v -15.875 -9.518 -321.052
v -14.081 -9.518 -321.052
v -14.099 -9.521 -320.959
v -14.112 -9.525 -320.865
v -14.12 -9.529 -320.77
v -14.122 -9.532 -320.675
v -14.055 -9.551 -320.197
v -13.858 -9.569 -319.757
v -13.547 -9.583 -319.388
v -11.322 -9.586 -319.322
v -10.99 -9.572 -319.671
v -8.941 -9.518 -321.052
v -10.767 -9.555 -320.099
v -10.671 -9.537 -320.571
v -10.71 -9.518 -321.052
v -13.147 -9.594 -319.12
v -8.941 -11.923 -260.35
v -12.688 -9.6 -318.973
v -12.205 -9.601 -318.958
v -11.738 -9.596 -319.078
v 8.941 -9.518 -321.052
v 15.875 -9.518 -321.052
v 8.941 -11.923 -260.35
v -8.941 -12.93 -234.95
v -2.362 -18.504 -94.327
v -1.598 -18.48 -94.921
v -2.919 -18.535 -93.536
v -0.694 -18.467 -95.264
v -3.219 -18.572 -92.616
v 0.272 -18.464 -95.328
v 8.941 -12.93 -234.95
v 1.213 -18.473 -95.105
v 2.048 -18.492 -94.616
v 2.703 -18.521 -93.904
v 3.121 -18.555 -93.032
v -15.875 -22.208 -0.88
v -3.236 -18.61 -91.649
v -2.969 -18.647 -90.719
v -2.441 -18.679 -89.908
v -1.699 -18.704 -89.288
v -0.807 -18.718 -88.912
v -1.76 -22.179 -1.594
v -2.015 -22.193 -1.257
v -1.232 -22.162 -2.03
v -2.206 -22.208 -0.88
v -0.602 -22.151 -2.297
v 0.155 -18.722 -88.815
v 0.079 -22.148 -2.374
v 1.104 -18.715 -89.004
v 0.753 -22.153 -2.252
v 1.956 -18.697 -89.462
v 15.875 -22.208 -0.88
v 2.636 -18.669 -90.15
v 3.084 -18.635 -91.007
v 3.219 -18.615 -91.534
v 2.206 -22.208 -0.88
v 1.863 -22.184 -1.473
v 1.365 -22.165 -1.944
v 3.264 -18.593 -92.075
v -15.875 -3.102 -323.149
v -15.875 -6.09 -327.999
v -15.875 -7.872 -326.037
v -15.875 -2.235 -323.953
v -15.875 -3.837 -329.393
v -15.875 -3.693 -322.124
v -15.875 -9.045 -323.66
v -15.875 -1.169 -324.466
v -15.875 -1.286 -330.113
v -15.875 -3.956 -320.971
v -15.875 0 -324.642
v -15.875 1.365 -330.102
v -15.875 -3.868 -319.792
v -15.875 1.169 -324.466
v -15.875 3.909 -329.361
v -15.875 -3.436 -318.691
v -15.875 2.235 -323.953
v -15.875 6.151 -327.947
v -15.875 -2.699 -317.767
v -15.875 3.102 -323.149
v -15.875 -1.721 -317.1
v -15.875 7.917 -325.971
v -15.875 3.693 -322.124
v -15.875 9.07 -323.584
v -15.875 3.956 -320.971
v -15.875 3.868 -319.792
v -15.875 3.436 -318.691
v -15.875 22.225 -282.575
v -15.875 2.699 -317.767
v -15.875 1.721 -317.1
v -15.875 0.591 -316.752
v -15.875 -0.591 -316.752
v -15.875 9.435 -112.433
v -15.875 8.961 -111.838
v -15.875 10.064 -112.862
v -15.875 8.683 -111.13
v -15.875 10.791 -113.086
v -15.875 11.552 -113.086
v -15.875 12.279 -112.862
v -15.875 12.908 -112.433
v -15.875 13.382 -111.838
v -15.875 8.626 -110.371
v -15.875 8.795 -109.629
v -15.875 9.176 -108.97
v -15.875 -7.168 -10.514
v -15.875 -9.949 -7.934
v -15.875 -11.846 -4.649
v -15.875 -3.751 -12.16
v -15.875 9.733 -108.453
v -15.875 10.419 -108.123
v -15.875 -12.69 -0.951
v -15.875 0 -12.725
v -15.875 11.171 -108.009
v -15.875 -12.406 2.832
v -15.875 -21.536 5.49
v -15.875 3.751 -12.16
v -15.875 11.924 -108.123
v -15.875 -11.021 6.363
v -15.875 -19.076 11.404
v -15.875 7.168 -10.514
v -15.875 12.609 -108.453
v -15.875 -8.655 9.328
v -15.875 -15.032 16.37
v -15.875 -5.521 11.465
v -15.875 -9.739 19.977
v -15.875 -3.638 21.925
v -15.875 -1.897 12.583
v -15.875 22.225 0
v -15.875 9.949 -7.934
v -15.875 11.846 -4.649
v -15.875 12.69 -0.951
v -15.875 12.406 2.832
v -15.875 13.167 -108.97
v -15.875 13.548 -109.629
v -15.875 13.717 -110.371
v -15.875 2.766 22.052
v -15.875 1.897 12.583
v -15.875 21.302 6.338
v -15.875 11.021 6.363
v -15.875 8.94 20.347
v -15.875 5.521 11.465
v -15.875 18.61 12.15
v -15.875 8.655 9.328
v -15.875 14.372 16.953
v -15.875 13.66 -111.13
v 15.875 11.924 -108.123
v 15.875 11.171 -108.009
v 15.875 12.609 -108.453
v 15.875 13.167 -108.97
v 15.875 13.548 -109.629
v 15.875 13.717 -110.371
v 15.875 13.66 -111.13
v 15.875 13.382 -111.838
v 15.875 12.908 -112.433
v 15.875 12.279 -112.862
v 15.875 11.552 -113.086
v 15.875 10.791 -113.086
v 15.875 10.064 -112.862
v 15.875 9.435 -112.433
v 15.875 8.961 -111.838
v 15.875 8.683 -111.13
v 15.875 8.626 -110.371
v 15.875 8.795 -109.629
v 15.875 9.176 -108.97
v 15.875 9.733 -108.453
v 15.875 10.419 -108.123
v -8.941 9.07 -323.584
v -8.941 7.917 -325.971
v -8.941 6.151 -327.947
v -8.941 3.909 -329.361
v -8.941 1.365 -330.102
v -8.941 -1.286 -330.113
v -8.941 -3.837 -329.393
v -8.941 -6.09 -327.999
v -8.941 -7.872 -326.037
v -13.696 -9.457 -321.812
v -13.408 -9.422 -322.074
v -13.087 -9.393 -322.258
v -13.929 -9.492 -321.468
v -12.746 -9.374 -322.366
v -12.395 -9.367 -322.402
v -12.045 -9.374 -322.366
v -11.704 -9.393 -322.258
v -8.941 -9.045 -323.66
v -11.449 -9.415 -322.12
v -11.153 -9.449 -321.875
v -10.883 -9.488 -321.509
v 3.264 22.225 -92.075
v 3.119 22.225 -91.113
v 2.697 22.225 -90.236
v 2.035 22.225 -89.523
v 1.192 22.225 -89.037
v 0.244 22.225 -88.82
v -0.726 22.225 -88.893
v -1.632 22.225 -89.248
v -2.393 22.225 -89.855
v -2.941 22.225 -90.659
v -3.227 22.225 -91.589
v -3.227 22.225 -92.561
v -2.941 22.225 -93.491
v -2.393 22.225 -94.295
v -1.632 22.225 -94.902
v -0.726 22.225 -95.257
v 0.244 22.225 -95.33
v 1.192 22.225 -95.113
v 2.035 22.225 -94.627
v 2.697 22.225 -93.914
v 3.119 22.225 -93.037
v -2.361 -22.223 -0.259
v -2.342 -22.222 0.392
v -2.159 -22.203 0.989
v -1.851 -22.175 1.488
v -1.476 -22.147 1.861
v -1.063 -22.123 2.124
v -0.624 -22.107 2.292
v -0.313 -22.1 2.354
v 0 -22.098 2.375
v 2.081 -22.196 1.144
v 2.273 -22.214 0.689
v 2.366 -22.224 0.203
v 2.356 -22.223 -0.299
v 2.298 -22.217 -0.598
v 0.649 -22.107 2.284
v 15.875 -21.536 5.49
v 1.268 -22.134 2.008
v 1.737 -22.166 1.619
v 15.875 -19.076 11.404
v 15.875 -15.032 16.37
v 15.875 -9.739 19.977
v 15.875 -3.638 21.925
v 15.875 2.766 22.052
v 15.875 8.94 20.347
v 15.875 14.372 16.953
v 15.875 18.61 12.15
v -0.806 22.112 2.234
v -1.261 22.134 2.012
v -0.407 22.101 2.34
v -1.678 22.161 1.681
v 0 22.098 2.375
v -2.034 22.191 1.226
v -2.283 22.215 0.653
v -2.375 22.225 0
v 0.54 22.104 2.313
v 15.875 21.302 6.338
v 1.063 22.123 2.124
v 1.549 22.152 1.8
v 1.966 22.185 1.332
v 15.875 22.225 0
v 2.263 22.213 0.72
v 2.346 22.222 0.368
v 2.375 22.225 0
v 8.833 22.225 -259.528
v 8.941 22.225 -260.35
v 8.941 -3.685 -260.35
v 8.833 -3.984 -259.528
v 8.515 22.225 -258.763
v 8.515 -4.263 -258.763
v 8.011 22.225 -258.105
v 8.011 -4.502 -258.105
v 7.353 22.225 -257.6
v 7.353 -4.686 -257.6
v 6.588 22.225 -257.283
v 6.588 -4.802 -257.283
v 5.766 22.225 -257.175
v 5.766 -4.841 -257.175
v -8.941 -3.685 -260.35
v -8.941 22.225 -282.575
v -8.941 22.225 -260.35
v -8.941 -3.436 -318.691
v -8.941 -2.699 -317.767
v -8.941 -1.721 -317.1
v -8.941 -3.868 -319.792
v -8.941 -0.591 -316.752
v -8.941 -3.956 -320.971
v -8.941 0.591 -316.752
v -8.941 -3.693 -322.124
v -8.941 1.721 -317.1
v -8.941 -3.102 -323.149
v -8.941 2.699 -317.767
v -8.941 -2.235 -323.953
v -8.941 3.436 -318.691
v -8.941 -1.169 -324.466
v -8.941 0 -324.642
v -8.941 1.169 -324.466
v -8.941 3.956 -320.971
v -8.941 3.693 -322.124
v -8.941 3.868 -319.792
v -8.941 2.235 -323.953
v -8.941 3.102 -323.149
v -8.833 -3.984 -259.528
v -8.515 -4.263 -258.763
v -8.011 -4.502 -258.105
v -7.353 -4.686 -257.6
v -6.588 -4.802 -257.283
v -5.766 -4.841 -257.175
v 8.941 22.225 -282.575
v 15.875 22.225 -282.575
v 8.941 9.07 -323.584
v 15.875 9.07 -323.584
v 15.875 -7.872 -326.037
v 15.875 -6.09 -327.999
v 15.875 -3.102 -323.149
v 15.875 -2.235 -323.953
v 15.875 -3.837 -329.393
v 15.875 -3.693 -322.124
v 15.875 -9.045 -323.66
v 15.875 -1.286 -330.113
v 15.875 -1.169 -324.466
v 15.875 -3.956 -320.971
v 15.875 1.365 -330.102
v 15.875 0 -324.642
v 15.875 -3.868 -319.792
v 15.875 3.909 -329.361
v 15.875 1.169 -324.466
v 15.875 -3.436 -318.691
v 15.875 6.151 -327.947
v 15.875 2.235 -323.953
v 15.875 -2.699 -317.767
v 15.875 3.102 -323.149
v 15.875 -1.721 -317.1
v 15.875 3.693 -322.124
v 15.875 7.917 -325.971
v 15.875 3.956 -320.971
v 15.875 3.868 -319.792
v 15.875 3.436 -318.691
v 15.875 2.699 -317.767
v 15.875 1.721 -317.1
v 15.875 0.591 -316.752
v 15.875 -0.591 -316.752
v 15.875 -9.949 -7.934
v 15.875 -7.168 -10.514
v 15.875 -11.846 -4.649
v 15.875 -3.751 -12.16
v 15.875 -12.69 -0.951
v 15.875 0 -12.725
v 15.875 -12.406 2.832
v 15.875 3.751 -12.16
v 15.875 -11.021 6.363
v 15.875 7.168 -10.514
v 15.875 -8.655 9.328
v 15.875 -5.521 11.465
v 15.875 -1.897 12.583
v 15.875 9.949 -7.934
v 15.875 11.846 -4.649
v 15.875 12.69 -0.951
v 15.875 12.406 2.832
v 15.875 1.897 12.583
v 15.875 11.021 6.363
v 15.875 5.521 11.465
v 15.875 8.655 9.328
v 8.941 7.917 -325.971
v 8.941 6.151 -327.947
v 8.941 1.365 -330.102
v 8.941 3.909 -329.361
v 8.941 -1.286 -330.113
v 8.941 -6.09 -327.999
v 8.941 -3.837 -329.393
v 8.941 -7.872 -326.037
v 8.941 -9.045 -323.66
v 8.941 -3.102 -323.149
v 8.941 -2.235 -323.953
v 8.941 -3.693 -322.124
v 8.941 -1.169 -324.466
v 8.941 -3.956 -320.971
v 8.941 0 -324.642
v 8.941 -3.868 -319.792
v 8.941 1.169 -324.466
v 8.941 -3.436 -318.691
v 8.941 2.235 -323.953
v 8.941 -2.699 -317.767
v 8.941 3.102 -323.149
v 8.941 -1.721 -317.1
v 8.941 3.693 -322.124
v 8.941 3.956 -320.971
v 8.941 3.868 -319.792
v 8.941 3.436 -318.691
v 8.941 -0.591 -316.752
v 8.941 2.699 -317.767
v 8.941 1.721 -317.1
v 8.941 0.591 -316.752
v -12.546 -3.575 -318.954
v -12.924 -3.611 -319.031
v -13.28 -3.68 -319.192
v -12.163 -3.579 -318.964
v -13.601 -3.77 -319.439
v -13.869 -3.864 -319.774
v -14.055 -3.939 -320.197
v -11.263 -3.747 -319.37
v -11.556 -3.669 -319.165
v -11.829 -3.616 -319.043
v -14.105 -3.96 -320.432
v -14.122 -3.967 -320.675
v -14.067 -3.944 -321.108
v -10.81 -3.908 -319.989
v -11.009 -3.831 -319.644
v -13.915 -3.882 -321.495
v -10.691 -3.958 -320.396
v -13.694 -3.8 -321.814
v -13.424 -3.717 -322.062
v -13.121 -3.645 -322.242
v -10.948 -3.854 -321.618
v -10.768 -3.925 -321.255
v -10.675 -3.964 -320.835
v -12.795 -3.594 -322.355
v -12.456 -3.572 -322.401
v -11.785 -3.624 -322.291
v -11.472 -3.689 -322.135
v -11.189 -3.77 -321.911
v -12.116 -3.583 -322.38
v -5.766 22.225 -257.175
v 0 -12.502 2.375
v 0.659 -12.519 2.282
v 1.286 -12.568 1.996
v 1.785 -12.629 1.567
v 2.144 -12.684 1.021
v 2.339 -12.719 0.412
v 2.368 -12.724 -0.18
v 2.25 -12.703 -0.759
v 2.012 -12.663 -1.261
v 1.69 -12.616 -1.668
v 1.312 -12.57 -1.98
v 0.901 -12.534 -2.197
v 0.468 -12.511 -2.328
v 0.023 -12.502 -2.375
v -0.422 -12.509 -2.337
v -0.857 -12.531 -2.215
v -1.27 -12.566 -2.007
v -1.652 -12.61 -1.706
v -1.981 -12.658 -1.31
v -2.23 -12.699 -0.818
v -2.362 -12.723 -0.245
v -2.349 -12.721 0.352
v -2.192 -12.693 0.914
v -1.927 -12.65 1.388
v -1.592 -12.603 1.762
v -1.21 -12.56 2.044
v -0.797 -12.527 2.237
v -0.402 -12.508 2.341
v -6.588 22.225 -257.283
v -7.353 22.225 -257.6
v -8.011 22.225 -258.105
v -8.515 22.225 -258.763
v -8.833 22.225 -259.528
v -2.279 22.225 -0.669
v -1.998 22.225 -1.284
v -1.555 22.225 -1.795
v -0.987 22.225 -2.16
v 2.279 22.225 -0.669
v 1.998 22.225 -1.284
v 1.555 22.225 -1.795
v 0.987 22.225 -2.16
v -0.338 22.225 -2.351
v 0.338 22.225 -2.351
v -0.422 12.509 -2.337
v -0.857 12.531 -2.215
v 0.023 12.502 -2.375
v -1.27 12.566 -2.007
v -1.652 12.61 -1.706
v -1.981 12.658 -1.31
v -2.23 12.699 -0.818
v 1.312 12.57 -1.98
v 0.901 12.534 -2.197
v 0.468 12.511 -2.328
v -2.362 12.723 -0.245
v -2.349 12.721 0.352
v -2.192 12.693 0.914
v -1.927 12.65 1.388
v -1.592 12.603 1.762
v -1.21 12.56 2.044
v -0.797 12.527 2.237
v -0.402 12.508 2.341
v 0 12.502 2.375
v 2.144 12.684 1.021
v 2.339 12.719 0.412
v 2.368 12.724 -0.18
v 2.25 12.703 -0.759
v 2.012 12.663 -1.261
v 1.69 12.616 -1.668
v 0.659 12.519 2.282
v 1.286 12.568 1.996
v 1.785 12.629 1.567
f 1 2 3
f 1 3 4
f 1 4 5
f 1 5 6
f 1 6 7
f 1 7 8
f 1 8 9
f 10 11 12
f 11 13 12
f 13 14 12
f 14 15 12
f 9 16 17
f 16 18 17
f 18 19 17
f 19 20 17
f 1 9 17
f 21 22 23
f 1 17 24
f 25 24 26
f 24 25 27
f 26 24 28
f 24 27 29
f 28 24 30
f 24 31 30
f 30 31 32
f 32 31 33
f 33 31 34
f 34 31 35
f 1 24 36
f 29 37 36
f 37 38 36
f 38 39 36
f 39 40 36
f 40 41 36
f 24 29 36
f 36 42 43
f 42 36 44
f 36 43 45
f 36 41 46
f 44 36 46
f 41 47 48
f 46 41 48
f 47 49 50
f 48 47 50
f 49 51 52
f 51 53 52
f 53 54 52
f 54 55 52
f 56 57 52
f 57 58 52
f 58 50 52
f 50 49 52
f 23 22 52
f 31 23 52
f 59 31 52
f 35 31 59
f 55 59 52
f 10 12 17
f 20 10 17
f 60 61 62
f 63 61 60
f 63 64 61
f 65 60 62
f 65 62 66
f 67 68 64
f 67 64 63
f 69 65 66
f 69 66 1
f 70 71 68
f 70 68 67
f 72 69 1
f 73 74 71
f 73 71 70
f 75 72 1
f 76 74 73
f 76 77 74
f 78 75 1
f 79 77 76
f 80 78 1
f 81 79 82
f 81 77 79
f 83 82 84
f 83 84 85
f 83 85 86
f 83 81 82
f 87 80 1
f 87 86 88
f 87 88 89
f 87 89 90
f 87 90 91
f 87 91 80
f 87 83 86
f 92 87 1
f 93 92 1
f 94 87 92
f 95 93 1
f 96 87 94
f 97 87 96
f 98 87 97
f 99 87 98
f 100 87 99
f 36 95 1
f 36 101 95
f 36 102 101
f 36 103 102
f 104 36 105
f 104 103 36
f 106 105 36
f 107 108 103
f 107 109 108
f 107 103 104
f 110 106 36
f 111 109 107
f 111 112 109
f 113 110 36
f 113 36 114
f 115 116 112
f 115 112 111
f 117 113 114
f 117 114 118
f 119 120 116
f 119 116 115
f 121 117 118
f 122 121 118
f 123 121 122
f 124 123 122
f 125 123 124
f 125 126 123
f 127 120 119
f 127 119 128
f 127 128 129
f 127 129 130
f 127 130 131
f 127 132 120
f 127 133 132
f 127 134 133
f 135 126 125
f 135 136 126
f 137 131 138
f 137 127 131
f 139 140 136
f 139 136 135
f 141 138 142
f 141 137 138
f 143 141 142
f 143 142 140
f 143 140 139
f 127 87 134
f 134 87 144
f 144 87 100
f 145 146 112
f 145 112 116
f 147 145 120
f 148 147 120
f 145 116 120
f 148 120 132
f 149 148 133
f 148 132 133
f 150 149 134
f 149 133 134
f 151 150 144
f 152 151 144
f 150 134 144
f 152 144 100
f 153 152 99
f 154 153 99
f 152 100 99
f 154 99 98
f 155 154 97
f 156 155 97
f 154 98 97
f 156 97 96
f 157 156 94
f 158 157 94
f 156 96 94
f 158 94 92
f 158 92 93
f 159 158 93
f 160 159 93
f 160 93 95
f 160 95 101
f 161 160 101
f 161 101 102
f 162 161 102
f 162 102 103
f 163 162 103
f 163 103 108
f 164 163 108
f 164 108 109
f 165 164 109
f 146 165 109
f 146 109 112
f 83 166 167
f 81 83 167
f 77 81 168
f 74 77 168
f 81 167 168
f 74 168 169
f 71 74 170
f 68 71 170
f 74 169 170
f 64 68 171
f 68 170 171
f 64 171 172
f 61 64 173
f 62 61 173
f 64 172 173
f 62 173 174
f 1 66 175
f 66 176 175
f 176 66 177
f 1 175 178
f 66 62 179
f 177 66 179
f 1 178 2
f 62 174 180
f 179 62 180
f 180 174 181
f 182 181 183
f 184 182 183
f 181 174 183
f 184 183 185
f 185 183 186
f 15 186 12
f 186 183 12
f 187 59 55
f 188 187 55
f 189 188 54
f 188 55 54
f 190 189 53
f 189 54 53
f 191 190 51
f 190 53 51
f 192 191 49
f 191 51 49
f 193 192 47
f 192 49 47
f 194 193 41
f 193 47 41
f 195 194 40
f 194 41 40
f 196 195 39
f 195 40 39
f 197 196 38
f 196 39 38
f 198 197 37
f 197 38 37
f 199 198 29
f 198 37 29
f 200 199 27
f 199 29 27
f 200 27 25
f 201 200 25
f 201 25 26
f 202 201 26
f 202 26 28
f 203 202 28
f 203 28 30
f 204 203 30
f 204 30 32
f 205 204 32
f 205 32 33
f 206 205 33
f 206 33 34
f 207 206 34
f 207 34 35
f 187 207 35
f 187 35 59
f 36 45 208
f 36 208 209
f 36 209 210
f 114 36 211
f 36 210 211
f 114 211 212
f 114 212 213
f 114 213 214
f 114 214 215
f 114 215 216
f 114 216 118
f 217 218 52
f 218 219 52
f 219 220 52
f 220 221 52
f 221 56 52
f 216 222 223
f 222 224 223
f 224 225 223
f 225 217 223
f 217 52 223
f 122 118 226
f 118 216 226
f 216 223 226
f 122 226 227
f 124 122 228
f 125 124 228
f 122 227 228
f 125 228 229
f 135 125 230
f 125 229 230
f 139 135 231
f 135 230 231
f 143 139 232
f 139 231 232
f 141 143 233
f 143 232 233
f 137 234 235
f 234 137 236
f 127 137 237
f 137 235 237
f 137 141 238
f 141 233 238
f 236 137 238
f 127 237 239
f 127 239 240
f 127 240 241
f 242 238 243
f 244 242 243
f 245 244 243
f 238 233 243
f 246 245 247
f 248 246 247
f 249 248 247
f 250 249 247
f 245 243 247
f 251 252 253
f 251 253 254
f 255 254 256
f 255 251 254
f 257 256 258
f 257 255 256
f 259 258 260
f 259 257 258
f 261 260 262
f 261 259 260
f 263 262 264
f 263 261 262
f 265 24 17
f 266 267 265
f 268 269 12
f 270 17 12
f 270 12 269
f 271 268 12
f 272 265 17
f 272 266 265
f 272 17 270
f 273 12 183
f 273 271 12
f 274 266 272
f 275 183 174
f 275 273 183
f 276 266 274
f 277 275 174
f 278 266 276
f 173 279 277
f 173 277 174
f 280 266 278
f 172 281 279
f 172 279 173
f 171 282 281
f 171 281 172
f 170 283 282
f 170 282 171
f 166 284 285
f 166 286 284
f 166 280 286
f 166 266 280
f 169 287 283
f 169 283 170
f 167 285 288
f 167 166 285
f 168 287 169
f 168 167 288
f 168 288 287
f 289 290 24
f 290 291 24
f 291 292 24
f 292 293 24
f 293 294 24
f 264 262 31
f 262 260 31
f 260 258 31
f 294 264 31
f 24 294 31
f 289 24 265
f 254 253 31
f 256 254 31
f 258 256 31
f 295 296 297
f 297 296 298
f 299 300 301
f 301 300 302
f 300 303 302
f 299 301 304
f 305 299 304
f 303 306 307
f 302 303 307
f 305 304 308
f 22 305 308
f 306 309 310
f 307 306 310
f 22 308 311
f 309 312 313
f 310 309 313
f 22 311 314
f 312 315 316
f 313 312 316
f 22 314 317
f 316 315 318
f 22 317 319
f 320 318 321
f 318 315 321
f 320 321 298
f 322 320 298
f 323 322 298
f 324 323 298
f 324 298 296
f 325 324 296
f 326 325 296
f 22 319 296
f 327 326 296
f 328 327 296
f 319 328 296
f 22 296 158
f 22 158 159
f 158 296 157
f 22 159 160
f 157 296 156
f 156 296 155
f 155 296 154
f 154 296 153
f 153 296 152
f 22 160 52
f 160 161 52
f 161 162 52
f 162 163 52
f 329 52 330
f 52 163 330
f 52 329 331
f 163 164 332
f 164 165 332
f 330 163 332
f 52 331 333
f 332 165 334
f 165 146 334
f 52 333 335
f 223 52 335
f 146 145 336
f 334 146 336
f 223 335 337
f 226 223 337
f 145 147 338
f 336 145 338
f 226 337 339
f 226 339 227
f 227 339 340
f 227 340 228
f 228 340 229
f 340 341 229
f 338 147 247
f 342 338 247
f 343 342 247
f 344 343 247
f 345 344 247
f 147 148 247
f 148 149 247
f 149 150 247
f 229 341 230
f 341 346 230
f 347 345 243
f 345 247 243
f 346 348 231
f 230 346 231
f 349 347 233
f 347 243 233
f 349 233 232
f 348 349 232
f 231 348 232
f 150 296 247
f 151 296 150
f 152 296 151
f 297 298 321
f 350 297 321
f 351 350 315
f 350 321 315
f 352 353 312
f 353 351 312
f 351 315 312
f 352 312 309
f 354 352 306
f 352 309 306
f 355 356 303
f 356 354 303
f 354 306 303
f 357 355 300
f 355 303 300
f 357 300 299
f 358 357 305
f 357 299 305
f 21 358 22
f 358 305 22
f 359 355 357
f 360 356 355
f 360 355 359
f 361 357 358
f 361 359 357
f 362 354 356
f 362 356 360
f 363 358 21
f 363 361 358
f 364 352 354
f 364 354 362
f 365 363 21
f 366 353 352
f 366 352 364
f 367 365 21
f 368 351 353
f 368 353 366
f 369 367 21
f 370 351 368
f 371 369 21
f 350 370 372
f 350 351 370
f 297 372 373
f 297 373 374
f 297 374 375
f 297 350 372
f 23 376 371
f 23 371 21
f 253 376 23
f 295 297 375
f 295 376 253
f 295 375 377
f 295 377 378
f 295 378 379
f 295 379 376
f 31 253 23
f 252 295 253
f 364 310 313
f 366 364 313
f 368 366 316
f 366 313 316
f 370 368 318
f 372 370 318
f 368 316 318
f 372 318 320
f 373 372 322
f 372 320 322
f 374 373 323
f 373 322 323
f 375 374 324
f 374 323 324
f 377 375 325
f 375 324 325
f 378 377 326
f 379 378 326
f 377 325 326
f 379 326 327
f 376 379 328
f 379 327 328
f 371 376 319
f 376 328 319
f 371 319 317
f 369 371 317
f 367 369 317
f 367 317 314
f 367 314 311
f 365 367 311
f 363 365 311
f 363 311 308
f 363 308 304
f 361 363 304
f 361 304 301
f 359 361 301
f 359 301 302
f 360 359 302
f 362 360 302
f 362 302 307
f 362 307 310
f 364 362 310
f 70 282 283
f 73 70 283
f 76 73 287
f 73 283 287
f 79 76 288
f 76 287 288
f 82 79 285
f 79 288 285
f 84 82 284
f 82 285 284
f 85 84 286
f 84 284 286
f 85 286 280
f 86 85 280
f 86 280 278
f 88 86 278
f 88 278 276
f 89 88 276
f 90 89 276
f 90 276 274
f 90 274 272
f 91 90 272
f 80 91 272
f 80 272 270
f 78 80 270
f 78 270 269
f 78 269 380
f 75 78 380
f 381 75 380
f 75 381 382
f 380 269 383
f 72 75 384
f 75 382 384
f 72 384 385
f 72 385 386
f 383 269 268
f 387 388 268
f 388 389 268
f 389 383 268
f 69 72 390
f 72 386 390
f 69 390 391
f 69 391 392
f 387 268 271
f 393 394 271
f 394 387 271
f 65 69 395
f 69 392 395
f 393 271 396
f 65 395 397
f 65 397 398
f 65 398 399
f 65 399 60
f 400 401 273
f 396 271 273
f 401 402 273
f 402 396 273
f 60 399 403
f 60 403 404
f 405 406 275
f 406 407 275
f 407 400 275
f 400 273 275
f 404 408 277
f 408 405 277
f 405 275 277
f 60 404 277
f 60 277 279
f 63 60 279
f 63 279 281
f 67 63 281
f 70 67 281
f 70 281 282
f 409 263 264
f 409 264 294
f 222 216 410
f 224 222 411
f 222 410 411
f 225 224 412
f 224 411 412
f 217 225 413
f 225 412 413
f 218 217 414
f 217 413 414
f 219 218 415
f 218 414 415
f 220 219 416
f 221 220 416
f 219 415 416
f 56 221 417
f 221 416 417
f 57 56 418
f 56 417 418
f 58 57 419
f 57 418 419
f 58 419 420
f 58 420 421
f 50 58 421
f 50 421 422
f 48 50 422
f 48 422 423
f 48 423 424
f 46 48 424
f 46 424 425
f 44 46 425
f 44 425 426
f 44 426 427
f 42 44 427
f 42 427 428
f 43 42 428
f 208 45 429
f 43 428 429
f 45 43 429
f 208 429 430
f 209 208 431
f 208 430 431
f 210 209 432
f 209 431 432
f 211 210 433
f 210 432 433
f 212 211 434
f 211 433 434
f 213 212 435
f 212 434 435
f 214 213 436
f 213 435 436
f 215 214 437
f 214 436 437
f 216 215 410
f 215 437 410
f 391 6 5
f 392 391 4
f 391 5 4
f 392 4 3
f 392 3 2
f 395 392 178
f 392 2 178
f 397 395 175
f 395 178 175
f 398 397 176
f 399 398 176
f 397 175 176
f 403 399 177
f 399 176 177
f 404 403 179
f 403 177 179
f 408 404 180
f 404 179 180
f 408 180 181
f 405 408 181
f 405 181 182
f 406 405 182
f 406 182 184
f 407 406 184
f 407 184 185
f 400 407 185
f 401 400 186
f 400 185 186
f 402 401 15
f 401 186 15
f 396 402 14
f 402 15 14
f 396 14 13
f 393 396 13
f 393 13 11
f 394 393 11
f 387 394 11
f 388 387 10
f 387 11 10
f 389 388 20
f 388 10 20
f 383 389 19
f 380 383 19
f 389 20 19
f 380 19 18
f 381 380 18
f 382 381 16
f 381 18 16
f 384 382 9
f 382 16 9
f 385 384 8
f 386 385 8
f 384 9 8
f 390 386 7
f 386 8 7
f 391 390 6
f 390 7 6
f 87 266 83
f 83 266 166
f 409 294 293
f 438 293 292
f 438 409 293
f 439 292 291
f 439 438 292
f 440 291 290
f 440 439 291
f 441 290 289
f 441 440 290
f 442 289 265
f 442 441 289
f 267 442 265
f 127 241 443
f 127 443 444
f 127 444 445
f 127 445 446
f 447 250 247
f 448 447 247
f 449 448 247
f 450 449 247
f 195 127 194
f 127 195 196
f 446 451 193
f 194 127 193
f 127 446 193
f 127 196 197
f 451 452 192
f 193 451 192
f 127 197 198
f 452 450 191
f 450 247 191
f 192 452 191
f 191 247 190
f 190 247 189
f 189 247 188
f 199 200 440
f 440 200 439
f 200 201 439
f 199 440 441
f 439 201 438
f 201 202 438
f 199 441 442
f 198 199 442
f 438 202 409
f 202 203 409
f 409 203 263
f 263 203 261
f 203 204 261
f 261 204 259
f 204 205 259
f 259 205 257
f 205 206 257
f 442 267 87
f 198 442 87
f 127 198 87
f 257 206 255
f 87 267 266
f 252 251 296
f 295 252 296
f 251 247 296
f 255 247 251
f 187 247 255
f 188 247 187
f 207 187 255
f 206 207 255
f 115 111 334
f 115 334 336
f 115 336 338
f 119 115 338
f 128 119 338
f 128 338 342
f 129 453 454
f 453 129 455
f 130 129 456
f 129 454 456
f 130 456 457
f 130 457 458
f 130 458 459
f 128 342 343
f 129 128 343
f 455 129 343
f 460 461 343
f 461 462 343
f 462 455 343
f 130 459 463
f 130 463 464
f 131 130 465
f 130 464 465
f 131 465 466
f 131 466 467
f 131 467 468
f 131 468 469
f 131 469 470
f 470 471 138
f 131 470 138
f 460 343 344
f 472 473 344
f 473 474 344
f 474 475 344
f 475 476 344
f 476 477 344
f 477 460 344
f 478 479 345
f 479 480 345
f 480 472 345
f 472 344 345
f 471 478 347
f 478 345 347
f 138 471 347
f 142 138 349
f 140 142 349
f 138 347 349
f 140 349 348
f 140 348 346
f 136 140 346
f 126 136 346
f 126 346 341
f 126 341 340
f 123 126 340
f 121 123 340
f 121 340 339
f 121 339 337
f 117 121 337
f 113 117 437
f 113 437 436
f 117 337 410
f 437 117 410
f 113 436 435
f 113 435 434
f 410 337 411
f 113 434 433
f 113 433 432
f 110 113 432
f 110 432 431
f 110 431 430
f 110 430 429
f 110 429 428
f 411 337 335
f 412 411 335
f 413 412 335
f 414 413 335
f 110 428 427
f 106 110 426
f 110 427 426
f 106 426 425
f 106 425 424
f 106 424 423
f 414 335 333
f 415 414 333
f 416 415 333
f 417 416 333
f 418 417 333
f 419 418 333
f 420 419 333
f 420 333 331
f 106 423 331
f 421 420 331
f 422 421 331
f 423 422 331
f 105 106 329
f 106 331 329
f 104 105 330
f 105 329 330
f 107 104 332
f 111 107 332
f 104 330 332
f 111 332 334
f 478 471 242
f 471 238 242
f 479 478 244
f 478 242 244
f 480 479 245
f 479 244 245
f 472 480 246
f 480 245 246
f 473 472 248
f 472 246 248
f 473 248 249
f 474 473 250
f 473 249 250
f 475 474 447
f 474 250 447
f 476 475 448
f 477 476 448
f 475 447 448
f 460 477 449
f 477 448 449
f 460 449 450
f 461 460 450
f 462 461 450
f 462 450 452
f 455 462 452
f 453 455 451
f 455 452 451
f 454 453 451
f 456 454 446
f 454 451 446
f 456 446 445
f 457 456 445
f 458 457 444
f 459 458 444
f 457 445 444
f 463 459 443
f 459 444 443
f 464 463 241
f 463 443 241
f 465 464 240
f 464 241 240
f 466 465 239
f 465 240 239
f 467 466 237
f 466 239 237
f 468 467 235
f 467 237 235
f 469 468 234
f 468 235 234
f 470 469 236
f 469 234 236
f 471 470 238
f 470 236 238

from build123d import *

# Parameters (mm, degrees)
BODY_DEPTH                 = 15.875
SKETCH2_R                  = 12.7254
F_1_002_HOLE_DEPTH         = 333.466619565
SKETCH3_R                  = 3.96748
F_3124_HOLE_DEPTH          = 333.466619565
SLOT_DEPTH                 = 25.4
ANGULAR_CLEARANCE_DEPTH    = 8.9408
SKETCH6_R                  = 2.3749
PIN_HOLE_DEPTH             = 25.4
F_5_16_18_TAPPED_HOLE1_D   = 6.5278
F_1_4_20_TAPPED_HOLE1_D    = 5.1054
F_8_32_TAPPED_HOLE1_REACH  = 334.421
F_8_32_TAPPED_HOLE1_BORE_R = 1.7272


with BuildPart() as part:
    # Sketch1 → BODY (new, symmetric)
    with BuildSketch(Plane(origin=(0, 0, 0), x_dir=(0, 0, -1), z_dir=(1, 0, 0))):
        with BuildLine():
            Line((0, 22.225), (282.575, 22.225))
            Line((282.575, 22.225), (323.58444924, 9.069770125))
            ThreePointArc((323.58444924, 9.069770125), (330.112821091, -1.285751941), (321.052227723, -9.517527213))
            Line((321.052227723, -9.517527213), (0.88019802, -22.207563496))
            ThreePointArc((0.88019802, -22.207563496), (-22.220640447, -0.440185355), (0, 22.225))
        make_face()
    extrude(amount=BODY_DEPTH, both=True)

    # Sketch2 → 1.002 HOLE (cut, through all)
    with BuildSketch(Plane(origin=(15.875, 0, 0), x_dir=(0, 0, -1), z_dir=(1, 0, 0))):
        Circle(SKETCH2_R)
    extrude(amount=-F_1_002_HOLE_DEPTH, mode=Mode.SUBTRACT)

    # Sketch3 → .3124 HOLE (cut, through all)
    with BuildSketch(Plane(origin=(15.875, 0, 0), x_dir=(0, 0, -1), z_dir=(1, 0, 0))):
        with Locations((320.675, 0)):
            Circle(SKETCH3_R)
    extrude(amount=-F_3124_HOLE_DEPTH, mode=Mode.SUBTRACT)

    # Sketch4 → SLOT (cut, symmetric)
    with BuildSketch(Plane(origin=(0, 0, 0), x_dir=(1, 0, 0), z_dir=(0, 1, 0))):
        with BuildLine():
            Line((-8.9408, 336.55), (8.9408, 336.55))
            Line((8.9408, 336.55), (8.9408, 260.35))
            ThreePointArc((8.9408, 260.35), (8.01086403, 258.10493597), (5.7658, 257.175))
            Line((5.7658, 257.175), (-5.7658, 257.175))
            ThreePointArc((-5.7658, 257.175), (-8.01086403, 258.10493597), (-8.9408, 260.35))
            Line((-8.9408, 260.35), (-8.9408, 336.55))
        make_face()
    extrude(amount=SLOT_DEPTH, both=True, mode=Mode.SUBTRACT)

    # Sketch5 → ANGULAR CLEARANCE (cut, symmetric)
    with BuildSketch(Plane(origin=(0, 0, 0), x_dir=(0, 0, -1), z_dir=(1, 0, 0))):
        Polygon((263.525, -2.529744374), (234.95, -12.930193819), (263.525, -11.797622097), align=None)
    extrude(amount=ANGULAR_CLEARANCE_DEPTH, both=True, mode=Mode.SUBTRACT)

    # Sketch6 → PIN HOLE (cut, symmetric)
    with BuildSketch(Plane(origin=(0, 0, 0), x_dir=(1, 0, 0), z_dir=(0, 1, 0))):
        with Locations(Location((0, 0, 0), (0, 0, 270))):
            Circle(SKETCH6_R)
    extrude(amount=PIN_HOLE_DEPTH, both=True, mode=Mode.SUBTRACT)

    # 5/16-18 Tapped Hole1 (through all)
    with Locations(Plane(origin=(0, 22.225, 0), x_dir=(-1, 0, 0), z_dir=(0, 1, 0))):
        with Locations((0, -92.075)):
            Hole(F_5_16_18_TAPPED_HOLE1_D / 2)

    # 1/4-20 Tapped Hole1 (through all)
    with Locations(Plane(origin=(15.875, 0, 0), x_dir=(0, 0, -1), z_dir=(1, 0, 0))):
        with Locations((110.562035551, 11.171477956)):
            Hole(F_1_4_20_TAPPED_HOLE1_D / 2)

    # #8-32 Tapped Hole1 bore → #8-32 Tapped Hole1 (cut, up to next)
    with BuildSketch(Plane(origin=(0, -12.7, 0), x_dir=(-1, 0, 0), z_dir=(0, -1, 0)), mode=Mode.PRIVATE) as f_8_32_tapped_hole1_sk1:
        with Locations((12.3952, 320.675)):
            Circle(F_8_32_TAPPED_HOLE1_BORE_R)
    f_8_32_tapped_hole1_tool1 = extrude(f_8_32_tapped_hole1_sk1.sketch, amount=-F_8_32_TAPPED_HOLE1_REACH, mode=Mode.PRIVATE) & part.part
    add(f_8_32_tapped_hole1_tool1.solids().sort_by_distance((-12.3952, -12.7, -320.675))[0], mode=Mode.SUBTRACT)


solid = part.part
